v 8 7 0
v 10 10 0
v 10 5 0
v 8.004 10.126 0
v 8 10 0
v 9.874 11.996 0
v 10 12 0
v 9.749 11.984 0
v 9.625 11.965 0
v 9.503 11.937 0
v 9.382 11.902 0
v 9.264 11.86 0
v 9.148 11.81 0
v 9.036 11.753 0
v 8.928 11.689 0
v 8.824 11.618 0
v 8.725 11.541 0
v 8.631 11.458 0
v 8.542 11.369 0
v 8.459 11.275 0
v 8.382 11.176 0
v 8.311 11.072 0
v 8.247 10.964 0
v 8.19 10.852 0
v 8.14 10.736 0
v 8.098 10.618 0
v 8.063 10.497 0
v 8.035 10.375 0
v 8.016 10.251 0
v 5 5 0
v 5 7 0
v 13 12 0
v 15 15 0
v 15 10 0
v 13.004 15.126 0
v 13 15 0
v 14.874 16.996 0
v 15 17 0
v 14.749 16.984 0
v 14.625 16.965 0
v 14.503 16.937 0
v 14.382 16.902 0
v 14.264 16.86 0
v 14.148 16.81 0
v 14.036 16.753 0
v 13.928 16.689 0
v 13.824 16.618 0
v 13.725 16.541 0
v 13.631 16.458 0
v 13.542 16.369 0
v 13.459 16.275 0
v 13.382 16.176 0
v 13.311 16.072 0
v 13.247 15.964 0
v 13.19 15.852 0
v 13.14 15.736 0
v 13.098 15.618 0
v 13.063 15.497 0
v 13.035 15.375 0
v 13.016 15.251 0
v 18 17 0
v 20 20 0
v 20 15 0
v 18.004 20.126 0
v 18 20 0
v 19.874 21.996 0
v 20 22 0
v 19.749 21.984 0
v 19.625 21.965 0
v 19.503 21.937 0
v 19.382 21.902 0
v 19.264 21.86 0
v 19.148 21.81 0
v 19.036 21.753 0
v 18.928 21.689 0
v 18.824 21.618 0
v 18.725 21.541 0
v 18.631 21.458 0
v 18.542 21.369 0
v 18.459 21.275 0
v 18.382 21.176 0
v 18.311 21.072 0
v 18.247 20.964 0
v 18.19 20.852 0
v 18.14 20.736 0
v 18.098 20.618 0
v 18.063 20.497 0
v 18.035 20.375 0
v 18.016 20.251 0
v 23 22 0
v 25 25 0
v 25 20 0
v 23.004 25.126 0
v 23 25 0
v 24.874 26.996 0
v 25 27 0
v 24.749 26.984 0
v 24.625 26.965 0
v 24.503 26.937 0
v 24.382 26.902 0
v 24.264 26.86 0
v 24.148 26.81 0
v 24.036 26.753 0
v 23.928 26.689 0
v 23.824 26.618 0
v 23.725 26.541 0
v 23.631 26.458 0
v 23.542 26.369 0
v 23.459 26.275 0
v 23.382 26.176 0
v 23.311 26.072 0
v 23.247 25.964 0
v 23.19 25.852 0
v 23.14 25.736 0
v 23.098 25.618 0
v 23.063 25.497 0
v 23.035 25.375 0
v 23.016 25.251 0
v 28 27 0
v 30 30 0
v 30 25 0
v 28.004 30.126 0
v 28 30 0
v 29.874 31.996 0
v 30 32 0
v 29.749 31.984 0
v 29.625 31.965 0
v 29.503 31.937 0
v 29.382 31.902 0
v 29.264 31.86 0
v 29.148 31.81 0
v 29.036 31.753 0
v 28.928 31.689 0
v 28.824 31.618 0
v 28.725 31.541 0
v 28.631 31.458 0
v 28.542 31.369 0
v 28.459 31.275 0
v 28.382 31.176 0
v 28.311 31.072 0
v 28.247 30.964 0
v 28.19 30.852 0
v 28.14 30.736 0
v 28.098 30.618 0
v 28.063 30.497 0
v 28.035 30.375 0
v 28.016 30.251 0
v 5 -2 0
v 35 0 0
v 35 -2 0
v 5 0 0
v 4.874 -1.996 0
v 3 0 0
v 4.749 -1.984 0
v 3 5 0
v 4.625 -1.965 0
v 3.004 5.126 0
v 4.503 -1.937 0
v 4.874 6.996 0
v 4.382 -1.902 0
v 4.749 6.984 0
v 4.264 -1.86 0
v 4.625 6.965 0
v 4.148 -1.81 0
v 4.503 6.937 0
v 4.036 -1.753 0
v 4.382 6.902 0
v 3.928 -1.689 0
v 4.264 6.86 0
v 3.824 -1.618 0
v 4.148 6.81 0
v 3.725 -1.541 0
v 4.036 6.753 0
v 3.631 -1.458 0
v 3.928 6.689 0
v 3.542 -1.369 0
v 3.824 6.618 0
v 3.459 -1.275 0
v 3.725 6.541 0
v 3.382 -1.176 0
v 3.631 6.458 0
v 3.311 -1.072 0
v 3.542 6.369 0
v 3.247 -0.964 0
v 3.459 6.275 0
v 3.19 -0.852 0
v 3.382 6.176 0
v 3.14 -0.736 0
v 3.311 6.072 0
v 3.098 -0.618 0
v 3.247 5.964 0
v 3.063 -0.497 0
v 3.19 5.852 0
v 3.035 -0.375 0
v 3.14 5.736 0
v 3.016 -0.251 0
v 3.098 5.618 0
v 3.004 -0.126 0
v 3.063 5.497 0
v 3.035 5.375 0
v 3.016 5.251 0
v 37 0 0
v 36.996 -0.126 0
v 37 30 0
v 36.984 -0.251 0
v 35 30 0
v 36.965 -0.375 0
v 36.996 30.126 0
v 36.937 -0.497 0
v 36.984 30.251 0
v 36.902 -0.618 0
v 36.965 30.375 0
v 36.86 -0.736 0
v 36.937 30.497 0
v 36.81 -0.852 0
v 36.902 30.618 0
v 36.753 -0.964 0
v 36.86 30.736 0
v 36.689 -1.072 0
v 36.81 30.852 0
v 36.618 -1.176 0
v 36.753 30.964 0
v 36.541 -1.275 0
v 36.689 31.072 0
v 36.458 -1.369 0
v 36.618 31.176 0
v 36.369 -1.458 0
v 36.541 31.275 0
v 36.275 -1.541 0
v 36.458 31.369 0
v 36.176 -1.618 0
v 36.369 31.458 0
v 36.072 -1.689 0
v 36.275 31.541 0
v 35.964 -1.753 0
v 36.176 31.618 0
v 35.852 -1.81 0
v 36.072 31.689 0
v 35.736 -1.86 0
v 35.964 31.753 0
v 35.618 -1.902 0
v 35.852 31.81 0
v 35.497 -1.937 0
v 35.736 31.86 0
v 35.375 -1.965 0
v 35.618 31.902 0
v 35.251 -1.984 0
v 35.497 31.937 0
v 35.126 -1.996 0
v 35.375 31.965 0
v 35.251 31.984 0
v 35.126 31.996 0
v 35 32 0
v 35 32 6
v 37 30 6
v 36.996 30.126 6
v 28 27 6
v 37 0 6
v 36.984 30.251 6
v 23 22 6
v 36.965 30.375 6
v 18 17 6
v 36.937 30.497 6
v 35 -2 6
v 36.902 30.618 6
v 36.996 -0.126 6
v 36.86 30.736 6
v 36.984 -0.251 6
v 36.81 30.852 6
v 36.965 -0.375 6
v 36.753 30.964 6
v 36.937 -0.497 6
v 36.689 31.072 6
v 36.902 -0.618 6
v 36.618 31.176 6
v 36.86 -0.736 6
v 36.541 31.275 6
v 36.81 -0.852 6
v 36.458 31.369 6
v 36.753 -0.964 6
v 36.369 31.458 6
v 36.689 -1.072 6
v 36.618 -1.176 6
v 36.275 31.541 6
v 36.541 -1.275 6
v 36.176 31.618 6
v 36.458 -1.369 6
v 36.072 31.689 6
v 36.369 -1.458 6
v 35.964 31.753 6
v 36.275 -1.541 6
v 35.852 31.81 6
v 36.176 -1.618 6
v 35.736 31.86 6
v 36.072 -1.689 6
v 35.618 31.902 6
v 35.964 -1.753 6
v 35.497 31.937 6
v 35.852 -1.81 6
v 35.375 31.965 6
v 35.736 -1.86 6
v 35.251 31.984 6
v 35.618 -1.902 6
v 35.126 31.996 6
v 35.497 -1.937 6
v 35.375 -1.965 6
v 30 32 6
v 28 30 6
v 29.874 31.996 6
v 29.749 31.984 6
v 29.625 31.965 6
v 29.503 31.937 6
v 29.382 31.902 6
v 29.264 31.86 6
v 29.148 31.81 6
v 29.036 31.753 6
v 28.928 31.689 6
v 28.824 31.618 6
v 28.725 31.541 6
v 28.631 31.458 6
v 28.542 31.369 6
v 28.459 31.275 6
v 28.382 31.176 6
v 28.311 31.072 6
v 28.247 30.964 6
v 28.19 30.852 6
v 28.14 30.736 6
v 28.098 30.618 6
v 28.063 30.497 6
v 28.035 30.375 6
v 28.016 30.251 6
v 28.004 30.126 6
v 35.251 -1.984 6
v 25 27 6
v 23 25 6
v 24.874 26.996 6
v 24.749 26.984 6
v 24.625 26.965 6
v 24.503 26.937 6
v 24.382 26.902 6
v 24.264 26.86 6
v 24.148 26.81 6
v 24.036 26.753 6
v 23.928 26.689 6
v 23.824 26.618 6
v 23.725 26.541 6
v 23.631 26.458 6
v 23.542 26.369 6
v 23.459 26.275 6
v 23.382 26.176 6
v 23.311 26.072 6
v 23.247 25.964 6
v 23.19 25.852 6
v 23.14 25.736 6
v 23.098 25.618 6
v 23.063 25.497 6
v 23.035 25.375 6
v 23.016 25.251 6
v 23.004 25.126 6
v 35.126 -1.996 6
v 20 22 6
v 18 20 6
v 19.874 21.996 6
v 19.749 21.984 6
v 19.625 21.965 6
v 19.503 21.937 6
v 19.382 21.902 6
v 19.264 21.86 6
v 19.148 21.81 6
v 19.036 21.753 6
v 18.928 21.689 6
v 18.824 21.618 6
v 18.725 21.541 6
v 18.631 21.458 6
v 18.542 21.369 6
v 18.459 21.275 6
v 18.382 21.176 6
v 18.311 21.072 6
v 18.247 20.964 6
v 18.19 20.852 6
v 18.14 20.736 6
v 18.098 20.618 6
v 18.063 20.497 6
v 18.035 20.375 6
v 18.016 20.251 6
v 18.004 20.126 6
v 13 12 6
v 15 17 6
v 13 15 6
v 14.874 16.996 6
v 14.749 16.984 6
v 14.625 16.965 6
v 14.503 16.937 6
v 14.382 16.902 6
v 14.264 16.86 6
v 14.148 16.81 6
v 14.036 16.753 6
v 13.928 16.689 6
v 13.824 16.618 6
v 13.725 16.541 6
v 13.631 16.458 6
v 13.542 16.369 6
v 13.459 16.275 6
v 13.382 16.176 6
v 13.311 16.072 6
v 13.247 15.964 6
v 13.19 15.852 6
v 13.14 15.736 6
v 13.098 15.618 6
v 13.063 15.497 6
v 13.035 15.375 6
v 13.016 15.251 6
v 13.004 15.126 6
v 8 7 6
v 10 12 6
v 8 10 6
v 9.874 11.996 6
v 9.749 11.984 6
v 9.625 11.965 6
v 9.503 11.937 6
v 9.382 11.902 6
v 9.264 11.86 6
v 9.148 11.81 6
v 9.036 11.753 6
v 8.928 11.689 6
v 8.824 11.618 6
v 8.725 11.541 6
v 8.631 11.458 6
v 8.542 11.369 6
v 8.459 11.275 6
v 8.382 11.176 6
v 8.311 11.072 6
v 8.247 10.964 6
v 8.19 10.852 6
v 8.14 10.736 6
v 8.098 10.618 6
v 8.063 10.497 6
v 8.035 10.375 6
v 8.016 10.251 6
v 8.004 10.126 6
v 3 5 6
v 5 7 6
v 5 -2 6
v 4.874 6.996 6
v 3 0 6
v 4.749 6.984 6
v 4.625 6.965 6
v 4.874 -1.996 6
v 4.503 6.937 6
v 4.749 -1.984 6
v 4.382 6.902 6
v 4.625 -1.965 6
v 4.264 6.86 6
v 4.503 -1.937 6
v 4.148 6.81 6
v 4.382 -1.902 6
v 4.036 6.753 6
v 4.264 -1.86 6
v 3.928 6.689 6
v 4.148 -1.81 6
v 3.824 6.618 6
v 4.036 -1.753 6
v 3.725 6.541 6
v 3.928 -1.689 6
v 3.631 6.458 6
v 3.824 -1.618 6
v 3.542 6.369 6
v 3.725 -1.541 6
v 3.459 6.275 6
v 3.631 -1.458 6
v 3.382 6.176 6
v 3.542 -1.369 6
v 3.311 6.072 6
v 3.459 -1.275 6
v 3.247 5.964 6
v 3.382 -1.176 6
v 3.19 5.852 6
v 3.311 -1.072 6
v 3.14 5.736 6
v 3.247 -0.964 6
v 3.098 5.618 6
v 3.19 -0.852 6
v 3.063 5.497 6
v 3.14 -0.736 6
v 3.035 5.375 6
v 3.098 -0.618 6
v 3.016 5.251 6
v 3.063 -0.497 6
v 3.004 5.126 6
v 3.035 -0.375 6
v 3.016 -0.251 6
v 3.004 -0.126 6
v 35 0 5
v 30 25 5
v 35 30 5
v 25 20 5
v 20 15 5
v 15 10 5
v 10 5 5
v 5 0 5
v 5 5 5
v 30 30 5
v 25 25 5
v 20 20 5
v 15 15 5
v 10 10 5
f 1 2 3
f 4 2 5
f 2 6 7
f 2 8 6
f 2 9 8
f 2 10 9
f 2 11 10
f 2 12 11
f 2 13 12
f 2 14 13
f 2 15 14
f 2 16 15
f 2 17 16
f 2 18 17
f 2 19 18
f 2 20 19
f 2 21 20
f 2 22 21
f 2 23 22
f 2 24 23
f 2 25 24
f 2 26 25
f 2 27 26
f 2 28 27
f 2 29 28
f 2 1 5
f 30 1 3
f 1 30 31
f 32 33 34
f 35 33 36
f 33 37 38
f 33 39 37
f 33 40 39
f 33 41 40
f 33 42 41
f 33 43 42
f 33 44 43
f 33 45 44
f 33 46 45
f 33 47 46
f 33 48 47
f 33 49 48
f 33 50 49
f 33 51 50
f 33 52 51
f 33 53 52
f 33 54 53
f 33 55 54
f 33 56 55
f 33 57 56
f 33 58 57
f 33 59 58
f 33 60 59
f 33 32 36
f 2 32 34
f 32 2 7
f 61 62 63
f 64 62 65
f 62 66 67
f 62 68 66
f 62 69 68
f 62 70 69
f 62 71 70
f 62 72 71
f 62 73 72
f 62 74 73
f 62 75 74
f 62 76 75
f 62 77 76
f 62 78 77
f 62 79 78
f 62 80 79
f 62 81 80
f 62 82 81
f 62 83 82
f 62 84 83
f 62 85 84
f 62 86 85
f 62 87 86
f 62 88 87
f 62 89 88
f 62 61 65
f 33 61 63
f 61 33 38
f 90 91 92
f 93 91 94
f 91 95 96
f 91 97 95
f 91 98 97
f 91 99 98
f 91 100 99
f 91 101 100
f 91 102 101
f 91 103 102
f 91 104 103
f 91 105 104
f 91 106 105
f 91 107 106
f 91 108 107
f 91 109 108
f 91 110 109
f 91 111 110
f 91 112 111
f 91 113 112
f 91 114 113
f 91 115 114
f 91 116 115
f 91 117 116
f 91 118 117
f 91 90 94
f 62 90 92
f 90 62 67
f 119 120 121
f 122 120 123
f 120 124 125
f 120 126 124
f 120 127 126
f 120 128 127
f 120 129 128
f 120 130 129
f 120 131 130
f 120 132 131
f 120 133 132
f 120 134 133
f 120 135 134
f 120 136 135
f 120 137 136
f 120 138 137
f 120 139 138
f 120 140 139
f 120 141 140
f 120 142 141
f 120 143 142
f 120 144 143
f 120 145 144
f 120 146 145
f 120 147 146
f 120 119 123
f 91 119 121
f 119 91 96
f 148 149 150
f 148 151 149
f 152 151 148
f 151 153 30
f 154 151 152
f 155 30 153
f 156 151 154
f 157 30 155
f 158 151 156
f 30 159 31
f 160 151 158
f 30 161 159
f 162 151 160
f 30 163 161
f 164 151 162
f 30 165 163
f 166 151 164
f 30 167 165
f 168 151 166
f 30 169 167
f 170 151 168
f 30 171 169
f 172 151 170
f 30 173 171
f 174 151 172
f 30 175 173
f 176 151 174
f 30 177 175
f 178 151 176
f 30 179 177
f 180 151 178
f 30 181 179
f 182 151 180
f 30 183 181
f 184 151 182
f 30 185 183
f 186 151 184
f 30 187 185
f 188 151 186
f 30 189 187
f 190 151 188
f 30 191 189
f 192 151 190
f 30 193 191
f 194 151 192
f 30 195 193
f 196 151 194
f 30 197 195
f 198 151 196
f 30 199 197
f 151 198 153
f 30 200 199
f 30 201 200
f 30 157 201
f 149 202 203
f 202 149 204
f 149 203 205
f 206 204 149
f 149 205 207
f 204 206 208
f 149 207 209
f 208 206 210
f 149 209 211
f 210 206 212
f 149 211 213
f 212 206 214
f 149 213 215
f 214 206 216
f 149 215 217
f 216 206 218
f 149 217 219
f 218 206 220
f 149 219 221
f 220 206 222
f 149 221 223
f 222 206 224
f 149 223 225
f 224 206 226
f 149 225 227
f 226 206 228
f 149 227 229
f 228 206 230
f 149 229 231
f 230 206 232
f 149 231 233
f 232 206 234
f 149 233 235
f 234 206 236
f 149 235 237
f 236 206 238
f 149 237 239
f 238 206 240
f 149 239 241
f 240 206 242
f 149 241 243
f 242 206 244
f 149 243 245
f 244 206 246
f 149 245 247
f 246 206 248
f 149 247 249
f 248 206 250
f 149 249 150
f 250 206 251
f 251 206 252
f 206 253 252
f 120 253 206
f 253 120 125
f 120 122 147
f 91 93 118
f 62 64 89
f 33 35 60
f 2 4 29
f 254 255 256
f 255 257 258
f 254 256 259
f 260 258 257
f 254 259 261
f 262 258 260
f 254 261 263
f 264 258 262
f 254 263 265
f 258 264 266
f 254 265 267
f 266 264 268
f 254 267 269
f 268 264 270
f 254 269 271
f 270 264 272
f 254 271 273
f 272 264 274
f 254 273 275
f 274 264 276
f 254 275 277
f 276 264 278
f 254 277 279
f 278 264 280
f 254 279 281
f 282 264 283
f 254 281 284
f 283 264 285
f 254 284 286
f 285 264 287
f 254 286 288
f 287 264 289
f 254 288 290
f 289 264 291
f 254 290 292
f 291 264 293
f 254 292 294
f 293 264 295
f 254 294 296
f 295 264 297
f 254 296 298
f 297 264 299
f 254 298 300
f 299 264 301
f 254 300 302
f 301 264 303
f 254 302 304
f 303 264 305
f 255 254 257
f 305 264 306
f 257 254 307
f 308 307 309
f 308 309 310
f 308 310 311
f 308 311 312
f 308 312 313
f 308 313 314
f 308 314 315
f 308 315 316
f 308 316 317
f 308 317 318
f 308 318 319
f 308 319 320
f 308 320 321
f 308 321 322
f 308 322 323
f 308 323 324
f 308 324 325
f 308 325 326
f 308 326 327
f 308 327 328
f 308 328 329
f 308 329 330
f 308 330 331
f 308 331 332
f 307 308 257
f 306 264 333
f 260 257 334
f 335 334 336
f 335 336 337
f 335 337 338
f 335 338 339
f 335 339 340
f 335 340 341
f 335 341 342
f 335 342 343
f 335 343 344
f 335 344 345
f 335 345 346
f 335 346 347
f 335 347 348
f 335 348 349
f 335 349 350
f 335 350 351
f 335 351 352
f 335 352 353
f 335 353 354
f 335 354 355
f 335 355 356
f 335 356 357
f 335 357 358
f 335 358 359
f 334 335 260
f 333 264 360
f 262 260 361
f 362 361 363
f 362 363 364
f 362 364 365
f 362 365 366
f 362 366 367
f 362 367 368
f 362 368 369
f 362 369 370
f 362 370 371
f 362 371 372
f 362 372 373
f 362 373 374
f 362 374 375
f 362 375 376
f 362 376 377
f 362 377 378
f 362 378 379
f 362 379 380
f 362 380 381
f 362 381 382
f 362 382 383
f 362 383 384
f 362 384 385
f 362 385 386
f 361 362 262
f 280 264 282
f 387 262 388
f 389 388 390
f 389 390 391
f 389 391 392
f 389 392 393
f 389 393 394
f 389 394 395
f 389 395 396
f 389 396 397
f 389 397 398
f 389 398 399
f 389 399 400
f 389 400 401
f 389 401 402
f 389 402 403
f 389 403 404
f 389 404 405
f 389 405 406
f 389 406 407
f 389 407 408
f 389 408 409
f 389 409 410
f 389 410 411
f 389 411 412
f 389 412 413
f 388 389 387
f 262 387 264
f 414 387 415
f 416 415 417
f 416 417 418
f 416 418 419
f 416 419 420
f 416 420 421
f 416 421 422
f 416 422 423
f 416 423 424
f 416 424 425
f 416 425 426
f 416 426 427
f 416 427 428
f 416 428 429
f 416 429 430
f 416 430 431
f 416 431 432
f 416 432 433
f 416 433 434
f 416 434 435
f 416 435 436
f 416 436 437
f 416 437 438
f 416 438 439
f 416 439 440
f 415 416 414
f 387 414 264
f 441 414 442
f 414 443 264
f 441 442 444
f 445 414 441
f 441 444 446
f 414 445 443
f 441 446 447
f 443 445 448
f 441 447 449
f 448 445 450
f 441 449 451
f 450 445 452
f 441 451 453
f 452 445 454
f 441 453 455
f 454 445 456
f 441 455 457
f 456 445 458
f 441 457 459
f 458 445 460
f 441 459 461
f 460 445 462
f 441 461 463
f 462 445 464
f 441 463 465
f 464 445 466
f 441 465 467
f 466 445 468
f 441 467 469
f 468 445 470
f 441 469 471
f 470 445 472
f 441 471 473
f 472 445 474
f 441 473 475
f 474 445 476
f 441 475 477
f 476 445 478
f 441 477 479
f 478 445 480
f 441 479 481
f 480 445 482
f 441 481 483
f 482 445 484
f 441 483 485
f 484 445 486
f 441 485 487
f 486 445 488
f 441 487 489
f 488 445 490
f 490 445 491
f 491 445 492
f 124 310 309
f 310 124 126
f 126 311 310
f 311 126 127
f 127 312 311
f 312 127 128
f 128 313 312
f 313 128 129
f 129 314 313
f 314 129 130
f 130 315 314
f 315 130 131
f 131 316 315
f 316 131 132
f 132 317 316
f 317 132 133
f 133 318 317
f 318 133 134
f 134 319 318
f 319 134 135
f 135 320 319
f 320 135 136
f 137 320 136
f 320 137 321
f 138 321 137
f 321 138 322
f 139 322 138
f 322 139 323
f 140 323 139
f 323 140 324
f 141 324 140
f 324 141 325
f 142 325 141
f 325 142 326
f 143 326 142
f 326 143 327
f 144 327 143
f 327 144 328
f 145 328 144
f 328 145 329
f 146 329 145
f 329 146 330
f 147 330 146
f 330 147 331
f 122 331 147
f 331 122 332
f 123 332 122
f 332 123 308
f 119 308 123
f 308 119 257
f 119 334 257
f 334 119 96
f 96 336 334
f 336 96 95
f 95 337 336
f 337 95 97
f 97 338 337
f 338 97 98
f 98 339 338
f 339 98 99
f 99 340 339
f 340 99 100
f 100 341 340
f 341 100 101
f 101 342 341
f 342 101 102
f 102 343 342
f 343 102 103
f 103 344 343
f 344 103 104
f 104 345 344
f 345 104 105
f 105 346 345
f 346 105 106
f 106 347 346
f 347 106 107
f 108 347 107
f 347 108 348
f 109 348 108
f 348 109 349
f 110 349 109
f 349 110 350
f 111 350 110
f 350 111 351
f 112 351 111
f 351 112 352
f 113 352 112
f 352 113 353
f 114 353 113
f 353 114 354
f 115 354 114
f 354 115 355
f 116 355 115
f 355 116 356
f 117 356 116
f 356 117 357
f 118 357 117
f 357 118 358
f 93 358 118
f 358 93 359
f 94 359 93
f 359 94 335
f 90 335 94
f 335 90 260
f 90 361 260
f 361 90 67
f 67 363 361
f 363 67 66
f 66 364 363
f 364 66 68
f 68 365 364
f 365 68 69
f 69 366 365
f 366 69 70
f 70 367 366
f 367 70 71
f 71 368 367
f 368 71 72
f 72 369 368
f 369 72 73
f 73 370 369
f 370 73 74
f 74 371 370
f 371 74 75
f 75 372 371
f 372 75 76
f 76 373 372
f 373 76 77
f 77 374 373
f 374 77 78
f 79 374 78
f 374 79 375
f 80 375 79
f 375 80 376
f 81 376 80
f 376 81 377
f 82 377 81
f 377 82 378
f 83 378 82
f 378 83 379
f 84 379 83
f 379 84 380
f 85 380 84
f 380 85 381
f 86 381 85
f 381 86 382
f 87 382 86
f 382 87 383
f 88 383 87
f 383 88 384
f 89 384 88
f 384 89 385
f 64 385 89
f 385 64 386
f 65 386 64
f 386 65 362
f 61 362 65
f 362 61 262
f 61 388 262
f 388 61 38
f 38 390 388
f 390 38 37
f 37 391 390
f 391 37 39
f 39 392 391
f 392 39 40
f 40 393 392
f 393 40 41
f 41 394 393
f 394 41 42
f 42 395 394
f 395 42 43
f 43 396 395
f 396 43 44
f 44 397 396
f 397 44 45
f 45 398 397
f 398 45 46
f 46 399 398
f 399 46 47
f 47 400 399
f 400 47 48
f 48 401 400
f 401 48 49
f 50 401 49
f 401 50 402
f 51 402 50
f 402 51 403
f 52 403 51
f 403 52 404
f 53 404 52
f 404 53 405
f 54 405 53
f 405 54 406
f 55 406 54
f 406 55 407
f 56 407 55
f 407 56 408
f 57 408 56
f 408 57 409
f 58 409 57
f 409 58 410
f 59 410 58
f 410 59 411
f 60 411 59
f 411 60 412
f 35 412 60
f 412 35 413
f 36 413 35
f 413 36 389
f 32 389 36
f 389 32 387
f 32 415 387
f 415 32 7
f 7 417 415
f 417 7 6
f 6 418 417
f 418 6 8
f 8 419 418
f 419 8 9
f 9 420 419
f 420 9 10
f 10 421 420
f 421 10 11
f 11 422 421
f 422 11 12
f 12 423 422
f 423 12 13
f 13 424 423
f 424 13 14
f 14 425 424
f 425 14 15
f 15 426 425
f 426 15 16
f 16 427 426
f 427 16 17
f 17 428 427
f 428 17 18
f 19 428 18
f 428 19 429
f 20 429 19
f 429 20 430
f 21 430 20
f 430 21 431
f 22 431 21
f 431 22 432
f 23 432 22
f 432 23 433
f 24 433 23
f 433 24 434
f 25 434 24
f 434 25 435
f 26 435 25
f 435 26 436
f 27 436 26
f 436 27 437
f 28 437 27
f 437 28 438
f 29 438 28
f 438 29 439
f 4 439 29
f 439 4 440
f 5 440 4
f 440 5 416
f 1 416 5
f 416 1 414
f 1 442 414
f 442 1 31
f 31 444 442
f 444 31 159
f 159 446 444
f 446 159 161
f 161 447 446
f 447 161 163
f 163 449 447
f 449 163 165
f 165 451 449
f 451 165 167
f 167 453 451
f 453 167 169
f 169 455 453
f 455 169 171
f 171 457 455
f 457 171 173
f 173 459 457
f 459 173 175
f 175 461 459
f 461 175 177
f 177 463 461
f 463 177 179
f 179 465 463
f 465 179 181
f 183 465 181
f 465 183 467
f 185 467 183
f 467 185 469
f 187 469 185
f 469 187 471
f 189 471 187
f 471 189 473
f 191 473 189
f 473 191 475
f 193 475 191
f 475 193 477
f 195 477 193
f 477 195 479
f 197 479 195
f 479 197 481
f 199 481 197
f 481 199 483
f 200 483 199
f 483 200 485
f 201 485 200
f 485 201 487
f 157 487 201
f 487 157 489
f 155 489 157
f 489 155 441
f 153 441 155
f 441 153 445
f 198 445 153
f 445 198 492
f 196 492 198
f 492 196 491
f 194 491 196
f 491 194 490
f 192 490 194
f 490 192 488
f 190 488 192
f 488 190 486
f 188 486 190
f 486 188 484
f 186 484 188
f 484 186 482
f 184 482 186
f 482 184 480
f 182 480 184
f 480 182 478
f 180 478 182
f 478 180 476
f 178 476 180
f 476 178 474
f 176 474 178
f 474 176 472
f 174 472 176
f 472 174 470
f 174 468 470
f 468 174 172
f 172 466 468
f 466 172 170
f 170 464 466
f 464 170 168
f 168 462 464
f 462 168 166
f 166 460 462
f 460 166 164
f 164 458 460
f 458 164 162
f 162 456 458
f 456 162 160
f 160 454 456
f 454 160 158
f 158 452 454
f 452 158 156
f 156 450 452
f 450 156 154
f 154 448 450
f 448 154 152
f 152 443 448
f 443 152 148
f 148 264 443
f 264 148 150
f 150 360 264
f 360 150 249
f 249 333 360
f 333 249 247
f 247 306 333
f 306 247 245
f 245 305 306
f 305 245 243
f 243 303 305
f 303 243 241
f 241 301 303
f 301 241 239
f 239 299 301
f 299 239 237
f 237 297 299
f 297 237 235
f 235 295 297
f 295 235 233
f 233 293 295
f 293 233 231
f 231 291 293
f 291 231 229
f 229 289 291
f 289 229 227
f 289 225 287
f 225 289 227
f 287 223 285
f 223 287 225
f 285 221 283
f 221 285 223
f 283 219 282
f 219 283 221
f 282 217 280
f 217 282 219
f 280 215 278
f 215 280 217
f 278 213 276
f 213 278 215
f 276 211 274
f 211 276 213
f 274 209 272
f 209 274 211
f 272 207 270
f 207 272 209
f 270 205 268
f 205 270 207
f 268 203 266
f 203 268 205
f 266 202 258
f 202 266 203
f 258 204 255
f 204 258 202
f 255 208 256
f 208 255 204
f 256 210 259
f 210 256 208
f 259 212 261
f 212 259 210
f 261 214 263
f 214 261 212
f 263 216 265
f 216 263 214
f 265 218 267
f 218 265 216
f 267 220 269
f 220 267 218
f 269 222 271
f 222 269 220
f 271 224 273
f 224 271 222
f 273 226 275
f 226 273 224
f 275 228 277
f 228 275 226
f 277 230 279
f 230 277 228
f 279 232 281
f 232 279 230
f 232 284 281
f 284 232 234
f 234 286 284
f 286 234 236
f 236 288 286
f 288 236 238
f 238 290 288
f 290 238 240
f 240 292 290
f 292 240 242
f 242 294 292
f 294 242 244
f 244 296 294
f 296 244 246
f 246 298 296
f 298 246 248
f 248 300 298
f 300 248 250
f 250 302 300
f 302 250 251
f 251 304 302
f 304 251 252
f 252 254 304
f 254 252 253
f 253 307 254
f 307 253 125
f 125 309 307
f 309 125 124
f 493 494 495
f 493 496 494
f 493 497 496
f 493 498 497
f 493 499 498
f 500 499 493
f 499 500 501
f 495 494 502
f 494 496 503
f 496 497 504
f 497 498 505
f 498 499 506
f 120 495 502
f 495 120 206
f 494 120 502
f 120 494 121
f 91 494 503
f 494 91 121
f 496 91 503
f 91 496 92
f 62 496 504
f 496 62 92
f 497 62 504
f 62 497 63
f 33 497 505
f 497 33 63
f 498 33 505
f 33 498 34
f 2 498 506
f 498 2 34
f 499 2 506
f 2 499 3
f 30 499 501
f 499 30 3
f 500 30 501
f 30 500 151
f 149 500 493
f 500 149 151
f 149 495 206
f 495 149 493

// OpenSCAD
module stair() {
	for(i = [0:6]) {
		translate([i * 5, 0]) {
			square([5, 5 * i]);
		}
	}
}

difference() {
	linear_extrude(height=6) {
		minkowski() {
			stair();
			circle(r=2, $fn=100);
		}
	}
	linear_extrude(height=5) {
		stair();
	}
}
